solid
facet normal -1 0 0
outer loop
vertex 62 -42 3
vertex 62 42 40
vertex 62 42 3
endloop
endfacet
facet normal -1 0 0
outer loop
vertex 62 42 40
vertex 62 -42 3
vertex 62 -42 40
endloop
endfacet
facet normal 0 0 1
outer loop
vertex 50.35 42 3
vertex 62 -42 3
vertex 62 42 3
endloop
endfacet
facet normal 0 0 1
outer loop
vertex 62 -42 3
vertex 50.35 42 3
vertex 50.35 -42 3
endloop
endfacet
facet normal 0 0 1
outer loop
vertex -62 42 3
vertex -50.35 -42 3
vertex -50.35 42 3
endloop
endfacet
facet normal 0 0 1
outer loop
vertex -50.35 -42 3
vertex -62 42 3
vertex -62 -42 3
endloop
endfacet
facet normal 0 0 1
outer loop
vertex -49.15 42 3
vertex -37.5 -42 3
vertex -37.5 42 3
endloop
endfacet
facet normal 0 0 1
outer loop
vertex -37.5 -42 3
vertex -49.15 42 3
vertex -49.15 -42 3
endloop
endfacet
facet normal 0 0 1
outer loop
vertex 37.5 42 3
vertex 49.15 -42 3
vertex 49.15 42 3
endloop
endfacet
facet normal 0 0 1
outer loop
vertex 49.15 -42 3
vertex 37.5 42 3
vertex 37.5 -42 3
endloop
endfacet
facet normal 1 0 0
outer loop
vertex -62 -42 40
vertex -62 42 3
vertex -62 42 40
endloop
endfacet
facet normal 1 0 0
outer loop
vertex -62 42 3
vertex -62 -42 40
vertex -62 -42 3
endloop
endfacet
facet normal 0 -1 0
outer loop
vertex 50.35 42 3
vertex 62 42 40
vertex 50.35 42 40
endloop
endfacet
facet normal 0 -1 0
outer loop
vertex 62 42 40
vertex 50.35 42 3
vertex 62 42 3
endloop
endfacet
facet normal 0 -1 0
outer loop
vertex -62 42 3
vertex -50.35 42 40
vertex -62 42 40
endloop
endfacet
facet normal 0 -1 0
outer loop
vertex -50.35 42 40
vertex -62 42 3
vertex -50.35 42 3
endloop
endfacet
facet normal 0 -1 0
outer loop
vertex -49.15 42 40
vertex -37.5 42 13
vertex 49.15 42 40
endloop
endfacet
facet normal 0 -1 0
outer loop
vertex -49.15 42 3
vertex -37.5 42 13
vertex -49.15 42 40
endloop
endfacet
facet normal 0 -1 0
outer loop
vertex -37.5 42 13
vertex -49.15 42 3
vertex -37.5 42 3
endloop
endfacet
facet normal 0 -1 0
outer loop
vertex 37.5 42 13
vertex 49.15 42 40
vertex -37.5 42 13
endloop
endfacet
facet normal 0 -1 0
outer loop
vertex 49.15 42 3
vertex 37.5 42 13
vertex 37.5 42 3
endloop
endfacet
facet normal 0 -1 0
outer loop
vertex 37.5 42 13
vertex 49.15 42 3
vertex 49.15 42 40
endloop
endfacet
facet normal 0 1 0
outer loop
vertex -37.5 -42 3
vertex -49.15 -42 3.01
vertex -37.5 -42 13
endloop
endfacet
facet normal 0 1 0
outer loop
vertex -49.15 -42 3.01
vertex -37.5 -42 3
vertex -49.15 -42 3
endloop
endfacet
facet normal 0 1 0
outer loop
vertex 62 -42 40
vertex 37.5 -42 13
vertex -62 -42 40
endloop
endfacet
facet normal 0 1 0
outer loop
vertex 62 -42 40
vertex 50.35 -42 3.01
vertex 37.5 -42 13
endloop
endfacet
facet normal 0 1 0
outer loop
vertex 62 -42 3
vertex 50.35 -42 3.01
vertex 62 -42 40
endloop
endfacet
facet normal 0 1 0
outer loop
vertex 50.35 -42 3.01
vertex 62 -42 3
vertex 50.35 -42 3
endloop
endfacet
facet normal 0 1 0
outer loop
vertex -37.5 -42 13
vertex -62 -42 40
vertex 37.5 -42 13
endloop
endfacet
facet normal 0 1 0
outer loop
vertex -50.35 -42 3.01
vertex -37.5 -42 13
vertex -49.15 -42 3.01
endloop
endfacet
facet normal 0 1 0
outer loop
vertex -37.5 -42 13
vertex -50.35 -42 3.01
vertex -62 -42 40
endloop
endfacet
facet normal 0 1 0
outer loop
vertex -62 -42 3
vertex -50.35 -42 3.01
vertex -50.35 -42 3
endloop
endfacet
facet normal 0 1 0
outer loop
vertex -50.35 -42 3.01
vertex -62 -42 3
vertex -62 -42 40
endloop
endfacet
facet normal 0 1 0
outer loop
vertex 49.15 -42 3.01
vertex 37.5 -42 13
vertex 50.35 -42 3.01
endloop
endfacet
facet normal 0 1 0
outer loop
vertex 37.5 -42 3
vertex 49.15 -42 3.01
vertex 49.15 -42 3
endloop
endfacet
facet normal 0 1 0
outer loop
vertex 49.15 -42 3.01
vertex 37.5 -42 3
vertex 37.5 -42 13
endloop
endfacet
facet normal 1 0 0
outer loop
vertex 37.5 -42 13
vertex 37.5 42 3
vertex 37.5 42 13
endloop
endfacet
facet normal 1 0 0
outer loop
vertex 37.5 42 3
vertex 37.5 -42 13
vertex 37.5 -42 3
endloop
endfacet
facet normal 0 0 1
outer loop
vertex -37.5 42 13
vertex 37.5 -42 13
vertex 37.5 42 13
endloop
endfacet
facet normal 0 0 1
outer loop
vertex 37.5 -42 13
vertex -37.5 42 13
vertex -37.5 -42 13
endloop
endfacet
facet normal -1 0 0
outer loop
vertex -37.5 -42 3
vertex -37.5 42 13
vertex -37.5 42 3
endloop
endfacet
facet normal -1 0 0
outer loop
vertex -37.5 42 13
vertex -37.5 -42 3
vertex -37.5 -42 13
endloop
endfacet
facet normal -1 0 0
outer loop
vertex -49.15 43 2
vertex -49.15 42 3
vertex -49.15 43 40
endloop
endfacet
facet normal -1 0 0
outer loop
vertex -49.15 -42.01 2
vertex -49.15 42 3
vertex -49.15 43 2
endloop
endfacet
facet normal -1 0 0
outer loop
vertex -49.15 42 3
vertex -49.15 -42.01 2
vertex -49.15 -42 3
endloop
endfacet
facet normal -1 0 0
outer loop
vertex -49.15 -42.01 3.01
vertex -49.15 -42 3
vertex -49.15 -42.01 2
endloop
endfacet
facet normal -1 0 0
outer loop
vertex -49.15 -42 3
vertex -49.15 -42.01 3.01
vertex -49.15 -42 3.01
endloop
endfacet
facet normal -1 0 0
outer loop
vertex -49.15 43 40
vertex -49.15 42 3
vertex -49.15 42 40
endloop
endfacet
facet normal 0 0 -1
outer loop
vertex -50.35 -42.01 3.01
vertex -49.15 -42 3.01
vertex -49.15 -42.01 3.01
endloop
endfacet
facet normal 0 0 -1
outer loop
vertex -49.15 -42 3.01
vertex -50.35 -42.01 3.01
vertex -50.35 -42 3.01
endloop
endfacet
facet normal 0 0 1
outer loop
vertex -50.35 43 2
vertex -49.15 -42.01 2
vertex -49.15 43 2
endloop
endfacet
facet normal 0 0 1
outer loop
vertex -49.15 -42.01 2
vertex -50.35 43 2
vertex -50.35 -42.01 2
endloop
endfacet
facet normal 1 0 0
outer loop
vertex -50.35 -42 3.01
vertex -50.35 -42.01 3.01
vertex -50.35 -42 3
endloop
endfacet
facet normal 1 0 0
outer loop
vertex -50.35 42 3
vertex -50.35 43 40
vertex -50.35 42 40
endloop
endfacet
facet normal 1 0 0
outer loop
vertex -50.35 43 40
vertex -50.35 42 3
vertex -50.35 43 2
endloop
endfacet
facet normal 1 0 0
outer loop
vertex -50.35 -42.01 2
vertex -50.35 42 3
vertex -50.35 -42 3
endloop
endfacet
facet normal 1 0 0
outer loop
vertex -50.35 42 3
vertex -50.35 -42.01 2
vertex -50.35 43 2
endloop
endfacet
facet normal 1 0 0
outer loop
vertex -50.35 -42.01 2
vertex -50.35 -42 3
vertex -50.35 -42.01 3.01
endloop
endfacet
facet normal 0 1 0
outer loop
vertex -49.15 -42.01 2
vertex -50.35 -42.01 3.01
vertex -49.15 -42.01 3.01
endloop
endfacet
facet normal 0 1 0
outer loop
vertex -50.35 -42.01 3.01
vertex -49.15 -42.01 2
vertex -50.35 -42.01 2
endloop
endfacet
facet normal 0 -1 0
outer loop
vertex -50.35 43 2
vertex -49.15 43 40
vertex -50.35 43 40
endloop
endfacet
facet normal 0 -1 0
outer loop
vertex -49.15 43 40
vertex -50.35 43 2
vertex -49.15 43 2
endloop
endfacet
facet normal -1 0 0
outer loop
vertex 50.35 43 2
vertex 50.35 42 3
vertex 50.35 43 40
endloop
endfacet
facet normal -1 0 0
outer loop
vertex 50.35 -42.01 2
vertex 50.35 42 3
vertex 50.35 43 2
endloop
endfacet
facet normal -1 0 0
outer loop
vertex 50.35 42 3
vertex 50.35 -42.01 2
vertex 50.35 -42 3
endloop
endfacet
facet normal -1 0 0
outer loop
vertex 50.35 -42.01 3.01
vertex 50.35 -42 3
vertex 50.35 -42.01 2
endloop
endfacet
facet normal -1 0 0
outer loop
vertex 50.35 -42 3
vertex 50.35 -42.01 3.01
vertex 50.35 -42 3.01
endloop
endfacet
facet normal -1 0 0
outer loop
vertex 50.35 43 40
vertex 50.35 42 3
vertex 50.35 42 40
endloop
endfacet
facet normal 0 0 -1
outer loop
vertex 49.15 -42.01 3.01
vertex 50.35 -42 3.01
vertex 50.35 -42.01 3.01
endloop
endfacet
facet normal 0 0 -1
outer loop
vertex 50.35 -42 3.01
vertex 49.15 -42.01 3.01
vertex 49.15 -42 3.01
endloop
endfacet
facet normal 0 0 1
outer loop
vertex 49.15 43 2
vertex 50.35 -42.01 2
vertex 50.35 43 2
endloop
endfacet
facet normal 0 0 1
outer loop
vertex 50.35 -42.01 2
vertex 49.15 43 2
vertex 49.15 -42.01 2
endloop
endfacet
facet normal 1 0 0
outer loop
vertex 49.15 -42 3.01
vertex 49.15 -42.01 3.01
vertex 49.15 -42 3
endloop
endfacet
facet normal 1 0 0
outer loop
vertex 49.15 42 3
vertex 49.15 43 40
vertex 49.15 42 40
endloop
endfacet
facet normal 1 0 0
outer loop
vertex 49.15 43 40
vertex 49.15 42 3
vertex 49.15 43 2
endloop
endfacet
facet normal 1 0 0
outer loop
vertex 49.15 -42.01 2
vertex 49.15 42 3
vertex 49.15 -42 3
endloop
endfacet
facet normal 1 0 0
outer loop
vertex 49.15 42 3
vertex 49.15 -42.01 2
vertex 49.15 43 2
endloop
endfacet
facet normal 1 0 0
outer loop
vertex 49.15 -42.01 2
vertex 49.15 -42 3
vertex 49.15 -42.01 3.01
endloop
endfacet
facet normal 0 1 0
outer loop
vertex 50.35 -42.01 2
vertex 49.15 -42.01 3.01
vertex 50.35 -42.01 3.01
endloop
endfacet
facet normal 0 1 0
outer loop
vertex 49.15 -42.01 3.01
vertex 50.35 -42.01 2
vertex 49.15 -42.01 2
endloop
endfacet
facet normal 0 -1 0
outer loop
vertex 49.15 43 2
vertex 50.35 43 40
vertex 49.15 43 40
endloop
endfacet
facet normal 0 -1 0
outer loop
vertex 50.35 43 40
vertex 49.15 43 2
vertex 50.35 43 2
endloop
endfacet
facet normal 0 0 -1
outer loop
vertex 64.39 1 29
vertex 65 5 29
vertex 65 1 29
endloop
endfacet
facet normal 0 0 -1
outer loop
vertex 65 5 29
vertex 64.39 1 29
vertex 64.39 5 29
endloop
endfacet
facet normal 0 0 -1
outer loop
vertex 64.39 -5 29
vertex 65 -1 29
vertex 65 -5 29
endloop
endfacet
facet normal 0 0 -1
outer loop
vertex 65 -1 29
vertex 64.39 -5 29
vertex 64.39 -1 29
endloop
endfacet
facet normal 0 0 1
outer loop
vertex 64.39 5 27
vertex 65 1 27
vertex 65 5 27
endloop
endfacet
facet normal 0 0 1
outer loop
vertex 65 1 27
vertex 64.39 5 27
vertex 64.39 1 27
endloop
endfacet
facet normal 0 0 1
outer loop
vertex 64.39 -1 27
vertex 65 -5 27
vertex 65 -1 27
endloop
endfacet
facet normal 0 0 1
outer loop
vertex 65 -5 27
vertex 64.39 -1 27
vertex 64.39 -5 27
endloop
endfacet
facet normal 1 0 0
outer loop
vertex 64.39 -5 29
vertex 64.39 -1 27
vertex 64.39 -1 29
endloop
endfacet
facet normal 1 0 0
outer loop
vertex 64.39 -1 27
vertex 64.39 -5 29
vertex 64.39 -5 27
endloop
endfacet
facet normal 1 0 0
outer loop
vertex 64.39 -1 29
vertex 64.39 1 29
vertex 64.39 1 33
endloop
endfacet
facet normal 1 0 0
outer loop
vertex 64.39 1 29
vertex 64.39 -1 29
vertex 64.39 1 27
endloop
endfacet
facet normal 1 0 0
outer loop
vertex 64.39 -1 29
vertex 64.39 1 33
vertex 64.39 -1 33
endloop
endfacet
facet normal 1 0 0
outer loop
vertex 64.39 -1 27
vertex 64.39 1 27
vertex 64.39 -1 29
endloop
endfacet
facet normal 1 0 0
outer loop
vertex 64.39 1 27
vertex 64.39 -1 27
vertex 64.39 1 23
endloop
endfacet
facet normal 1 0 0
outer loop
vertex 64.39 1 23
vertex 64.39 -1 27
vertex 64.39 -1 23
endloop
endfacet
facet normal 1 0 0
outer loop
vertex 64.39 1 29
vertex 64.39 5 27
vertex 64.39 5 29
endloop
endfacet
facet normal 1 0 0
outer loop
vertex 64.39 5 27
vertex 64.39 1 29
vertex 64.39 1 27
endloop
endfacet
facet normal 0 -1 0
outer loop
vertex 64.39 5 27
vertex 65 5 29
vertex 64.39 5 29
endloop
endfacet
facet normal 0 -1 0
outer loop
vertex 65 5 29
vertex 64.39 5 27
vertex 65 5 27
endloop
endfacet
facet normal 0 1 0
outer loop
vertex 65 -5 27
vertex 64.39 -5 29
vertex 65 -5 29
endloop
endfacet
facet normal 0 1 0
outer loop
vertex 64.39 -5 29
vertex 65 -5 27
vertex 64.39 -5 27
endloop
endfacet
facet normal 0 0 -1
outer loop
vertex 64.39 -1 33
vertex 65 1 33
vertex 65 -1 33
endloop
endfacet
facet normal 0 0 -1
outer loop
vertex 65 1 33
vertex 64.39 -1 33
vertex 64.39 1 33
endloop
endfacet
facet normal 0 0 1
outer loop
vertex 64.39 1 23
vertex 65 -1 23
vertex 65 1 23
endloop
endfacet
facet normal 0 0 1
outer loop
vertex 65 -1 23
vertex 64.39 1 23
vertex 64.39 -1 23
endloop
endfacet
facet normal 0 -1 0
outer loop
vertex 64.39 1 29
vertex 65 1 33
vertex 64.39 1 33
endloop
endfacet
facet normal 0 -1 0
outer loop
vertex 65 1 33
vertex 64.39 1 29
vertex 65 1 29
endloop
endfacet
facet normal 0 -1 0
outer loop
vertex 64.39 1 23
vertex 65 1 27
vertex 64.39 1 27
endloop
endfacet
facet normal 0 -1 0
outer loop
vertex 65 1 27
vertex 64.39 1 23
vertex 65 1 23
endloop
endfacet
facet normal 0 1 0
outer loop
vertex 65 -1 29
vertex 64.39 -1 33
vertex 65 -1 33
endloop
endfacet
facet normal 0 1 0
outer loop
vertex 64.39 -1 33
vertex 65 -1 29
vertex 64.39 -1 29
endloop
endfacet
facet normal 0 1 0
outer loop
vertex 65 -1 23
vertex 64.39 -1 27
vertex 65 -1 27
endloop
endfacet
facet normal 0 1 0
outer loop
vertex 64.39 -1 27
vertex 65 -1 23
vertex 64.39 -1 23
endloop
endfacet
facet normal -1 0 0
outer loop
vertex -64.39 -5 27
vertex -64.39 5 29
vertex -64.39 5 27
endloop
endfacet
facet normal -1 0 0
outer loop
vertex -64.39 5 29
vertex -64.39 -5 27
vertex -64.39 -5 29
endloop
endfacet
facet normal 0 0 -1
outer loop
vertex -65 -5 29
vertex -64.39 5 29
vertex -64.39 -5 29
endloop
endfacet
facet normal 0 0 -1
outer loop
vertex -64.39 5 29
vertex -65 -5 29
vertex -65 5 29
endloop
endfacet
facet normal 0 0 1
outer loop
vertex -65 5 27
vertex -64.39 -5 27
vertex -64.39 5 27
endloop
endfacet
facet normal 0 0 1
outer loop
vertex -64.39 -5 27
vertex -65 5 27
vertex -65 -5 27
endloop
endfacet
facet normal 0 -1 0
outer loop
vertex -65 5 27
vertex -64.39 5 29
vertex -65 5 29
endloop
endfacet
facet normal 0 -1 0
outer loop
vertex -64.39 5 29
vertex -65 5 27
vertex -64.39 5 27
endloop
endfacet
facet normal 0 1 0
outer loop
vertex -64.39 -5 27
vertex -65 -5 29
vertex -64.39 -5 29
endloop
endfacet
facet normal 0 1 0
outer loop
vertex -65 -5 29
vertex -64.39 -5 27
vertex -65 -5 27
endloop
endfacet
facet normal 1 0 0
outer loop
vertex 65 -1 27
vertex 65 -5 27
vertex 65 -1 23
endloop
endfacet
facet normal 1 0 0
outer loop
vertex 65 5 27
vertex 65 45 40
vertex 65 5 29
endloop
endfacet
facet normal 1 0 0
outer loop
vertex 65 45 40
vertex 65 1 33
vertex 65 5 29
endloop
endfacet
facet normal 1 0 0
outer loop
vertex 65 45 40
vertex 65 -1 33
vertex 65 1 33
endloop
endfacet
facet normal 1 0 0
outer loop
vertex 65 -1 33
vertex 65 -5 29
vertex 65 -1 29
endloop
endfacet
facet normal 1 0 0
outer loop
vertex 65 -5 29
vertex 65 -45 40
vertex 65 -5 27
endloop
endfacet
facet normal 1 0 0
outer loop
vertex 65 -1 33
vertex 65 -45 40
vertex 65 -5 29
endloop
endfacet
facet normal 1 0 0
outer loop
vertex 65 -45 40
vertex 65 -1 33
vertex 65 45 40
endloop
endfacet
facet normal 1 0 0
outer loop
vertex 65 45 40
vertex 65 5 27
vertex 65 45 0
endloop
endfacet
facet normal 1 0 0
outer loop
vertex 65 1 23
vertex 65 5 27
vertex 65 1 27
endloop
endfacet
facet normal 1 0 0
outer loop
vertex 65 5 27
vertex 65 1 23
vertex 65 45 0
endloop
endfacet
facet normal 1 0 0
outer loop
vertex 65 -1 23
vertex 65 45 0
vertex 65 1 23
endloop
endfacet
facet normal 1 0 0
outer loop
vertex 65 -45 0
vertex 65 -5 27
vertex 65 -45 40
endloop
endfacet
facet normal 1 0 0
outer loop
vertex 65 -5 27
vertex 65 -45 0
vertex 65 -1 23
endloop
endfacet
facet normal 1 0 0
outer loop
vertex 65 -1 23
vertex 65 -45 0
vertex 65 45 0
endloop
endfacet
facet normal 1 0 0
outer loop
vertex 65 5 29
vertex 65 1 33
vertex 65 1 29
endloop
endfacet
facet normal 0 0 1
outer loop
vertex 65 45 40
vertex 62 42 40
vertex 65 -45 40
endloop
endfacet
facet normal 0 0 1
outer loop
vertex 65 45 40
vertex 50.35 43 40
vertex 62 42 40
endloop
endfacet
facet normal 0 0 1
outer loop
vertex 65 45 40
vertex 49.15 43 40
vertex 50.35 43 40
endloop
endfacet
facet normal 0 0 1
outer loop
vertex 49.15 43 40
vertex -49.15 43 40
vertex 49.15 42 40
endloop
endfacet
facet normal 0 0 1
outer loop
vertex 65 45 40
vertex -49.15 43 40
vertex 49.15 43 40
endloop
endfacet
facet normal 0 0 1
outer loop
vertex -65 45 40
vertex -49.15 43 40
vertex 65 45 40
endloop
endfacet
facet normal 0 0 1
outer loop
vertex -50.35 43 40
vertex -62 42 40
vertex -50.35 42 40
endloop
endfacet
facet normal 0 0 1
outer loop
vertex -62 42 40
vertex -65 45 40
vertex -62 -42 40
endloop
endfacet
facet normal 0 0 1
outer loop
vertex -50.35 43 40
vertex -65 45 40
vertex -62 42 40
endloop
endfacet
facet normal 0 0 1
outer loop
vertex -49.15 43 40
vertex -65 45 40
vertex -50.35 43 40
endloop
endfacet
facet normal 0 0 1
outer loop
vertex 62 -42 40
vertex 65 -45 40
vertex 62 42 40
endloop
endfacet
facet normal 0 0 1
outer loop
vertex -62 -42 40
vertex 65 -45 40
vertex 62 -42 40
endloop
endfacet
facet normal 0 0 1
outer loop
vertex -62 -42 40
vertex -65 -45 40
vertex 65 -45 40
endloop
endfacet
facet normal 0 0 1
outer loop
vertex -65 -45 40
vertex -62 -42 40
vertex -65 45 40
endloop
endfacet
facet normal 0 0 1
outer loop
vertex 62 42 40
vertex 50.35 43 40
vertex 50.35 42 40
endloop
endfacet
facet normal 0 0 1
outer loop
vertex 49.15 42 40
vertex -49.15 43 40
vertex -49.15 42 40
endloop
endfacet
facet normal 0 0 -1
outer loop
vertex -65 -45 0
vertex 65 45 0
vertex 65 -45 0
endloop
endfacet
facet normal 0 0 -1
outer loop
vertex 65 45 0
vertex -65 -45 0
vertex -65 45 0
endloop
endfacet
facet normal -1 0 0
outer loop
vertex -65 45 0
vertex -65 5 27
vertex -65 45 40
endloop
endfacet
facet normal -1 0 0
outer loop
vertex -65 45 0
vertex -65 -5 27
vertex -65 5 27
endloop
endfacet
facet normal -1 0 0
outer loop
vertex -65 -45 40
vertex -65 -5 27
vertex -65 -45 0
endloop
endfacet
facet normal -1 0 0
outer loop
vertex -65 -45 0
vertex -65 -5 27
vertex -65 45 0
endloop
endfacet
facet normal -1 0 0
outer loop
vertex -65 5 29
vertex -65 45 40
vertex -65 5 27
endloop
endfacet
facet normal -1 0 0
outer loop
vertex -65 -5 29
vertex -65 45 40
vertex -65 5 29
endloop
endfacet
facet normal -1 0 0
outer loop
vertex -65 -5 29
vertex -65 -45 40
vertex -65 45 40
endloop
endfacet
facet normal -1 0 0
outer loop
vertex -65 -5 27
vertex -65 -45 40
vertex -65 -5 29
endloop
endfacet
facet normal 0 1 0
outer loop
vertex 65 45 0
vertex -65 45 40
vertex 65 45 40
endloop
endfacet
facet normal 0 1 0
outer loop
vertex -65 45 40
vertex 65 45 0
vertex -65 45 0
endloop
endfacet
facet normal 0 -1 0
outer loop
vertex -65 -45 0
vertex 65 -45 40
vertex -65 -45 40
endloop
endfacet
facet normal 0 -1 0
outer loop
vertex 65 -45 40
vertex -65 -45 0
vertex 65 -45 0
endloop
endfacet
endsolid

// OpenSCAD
// Buffer tank for a mini horizontal gel-electrophoresis box
// Category: full hardware. Raised gel platform between two buffer chambers; 84 mm
// inside, so standard 7 cm trays fit. The library's 80 mm comb needs a tray with side
// walls or comb slots to rest on (not included).
// Electrodes: a wire runs across the floor of each chamber along Y, held in the floor
// groove, and climbs the +Y side wall in the vertical groove to the rim. That keeps it under
// a normal buffer level (2-6 mm over the gel) and spans the whole chamber for straight
// bands. Use platinum (or graphite) for the anode; stainless steel only as the cathode.
// The end walls are engraved "+" (+X, anode, red) and "-" (-X, cathode, black): load the
// wells at the - end; DNA runs towards +. Reversed leads corrode a steel anode.
// There are no holes below the buffer line, so nothing can leak.
// SAFETY: electrophoresis runs at ~50-150 V DC. The LID AND INTERLOCK ARE NOT INCLUDED
// IN THIS FILE. Do not connect a power supply until a lid carries shrouded connectors so
// that lifting it breaks the circuit, and no bare wire is reachable outside the tank.
// Print: PETG, 0.2 mm layers, 4+ perimeters; leak-test with water before use.
// SPDX-License-Identifier: CERN-OHL-P-2.0

/* [Tank] */
// X, Y, Z
outer = [130, 90, 40];
wall = 3;
floor_t = 3;
// along X, centred; fits a 7 cm tray with room to lift it
platform_len = 75;
// above the inner floor
platform_h = 10;
// electrode-wire groove width, depth (0.25-0.5 mm wire)
groove = [1.2, 1.0];

/* [Hidden] */
eps = 0.01;
inner = [outer.x - 2 * wall, outer.y - 2 * wall];
chamber_x = (platform_len / 2 + inner.x / 2) / 2;   // middle of each buffer chamber

// parameter checks: stop with a message instead of building a broken part
assert(wall >= 2 && floor_t >= 2, "a tank that holds buffer needs walls and floor of at least 2 mm");
assert(groove[1] <= floor_t - 1.2 && groove[1] <= wall - 1.2, "the electrode groove leaves less than 1.2 mm of floor or wall: it may leak");
assert(platform_len <= inner.x - 20, "the platform leaves less than 10 mm for each buffer chamber");

difference() {
    translate([-outer.x / 2, -outer.y / 2, 0]) cube(outer);
    difference() {
        translate([-inner.x / 2, -inner.y / 2, floor_t]) cube([inner.x, inner.y, outer.z]);
        translate([-platform_len / 2, -outer.y / 2, 0]) cube([platform_len, outer.y, floor_t + platform_h]);
    }
    for (sx = [-1, 1]) {
        // floor groove across each chamber (along Y)
        translate([sx * chamber_x - groove[0] / 2, -inner.y / 2 - eps, floor_t - groove[1]])
            cube([groove[0], inner.y + 2 * eps, groove[1] + eps]);
        // vertical groove up the side wall at the end of the floor groove, to the rim
        translate([sx * chamber_x - groove[0] / 2, inner.y / 2 - eps, floor_t - groove[1]])
            cube([groove[0], groove[1] + eps, outer.z]);
    }
    // polarity marks, 0.6 mm deep, on the outside of the end walls
    for (sx = [-1, 1])
        translate([sx * (outer.x / 2 - 0.3), 0, outer.z - 12]) {
            cube([0.6 + 2 * eps, 10, 2], center = true);
            if (sx > 0) cube([0.6 + 2 * eps, 2, 10], center = true);
        }
}
